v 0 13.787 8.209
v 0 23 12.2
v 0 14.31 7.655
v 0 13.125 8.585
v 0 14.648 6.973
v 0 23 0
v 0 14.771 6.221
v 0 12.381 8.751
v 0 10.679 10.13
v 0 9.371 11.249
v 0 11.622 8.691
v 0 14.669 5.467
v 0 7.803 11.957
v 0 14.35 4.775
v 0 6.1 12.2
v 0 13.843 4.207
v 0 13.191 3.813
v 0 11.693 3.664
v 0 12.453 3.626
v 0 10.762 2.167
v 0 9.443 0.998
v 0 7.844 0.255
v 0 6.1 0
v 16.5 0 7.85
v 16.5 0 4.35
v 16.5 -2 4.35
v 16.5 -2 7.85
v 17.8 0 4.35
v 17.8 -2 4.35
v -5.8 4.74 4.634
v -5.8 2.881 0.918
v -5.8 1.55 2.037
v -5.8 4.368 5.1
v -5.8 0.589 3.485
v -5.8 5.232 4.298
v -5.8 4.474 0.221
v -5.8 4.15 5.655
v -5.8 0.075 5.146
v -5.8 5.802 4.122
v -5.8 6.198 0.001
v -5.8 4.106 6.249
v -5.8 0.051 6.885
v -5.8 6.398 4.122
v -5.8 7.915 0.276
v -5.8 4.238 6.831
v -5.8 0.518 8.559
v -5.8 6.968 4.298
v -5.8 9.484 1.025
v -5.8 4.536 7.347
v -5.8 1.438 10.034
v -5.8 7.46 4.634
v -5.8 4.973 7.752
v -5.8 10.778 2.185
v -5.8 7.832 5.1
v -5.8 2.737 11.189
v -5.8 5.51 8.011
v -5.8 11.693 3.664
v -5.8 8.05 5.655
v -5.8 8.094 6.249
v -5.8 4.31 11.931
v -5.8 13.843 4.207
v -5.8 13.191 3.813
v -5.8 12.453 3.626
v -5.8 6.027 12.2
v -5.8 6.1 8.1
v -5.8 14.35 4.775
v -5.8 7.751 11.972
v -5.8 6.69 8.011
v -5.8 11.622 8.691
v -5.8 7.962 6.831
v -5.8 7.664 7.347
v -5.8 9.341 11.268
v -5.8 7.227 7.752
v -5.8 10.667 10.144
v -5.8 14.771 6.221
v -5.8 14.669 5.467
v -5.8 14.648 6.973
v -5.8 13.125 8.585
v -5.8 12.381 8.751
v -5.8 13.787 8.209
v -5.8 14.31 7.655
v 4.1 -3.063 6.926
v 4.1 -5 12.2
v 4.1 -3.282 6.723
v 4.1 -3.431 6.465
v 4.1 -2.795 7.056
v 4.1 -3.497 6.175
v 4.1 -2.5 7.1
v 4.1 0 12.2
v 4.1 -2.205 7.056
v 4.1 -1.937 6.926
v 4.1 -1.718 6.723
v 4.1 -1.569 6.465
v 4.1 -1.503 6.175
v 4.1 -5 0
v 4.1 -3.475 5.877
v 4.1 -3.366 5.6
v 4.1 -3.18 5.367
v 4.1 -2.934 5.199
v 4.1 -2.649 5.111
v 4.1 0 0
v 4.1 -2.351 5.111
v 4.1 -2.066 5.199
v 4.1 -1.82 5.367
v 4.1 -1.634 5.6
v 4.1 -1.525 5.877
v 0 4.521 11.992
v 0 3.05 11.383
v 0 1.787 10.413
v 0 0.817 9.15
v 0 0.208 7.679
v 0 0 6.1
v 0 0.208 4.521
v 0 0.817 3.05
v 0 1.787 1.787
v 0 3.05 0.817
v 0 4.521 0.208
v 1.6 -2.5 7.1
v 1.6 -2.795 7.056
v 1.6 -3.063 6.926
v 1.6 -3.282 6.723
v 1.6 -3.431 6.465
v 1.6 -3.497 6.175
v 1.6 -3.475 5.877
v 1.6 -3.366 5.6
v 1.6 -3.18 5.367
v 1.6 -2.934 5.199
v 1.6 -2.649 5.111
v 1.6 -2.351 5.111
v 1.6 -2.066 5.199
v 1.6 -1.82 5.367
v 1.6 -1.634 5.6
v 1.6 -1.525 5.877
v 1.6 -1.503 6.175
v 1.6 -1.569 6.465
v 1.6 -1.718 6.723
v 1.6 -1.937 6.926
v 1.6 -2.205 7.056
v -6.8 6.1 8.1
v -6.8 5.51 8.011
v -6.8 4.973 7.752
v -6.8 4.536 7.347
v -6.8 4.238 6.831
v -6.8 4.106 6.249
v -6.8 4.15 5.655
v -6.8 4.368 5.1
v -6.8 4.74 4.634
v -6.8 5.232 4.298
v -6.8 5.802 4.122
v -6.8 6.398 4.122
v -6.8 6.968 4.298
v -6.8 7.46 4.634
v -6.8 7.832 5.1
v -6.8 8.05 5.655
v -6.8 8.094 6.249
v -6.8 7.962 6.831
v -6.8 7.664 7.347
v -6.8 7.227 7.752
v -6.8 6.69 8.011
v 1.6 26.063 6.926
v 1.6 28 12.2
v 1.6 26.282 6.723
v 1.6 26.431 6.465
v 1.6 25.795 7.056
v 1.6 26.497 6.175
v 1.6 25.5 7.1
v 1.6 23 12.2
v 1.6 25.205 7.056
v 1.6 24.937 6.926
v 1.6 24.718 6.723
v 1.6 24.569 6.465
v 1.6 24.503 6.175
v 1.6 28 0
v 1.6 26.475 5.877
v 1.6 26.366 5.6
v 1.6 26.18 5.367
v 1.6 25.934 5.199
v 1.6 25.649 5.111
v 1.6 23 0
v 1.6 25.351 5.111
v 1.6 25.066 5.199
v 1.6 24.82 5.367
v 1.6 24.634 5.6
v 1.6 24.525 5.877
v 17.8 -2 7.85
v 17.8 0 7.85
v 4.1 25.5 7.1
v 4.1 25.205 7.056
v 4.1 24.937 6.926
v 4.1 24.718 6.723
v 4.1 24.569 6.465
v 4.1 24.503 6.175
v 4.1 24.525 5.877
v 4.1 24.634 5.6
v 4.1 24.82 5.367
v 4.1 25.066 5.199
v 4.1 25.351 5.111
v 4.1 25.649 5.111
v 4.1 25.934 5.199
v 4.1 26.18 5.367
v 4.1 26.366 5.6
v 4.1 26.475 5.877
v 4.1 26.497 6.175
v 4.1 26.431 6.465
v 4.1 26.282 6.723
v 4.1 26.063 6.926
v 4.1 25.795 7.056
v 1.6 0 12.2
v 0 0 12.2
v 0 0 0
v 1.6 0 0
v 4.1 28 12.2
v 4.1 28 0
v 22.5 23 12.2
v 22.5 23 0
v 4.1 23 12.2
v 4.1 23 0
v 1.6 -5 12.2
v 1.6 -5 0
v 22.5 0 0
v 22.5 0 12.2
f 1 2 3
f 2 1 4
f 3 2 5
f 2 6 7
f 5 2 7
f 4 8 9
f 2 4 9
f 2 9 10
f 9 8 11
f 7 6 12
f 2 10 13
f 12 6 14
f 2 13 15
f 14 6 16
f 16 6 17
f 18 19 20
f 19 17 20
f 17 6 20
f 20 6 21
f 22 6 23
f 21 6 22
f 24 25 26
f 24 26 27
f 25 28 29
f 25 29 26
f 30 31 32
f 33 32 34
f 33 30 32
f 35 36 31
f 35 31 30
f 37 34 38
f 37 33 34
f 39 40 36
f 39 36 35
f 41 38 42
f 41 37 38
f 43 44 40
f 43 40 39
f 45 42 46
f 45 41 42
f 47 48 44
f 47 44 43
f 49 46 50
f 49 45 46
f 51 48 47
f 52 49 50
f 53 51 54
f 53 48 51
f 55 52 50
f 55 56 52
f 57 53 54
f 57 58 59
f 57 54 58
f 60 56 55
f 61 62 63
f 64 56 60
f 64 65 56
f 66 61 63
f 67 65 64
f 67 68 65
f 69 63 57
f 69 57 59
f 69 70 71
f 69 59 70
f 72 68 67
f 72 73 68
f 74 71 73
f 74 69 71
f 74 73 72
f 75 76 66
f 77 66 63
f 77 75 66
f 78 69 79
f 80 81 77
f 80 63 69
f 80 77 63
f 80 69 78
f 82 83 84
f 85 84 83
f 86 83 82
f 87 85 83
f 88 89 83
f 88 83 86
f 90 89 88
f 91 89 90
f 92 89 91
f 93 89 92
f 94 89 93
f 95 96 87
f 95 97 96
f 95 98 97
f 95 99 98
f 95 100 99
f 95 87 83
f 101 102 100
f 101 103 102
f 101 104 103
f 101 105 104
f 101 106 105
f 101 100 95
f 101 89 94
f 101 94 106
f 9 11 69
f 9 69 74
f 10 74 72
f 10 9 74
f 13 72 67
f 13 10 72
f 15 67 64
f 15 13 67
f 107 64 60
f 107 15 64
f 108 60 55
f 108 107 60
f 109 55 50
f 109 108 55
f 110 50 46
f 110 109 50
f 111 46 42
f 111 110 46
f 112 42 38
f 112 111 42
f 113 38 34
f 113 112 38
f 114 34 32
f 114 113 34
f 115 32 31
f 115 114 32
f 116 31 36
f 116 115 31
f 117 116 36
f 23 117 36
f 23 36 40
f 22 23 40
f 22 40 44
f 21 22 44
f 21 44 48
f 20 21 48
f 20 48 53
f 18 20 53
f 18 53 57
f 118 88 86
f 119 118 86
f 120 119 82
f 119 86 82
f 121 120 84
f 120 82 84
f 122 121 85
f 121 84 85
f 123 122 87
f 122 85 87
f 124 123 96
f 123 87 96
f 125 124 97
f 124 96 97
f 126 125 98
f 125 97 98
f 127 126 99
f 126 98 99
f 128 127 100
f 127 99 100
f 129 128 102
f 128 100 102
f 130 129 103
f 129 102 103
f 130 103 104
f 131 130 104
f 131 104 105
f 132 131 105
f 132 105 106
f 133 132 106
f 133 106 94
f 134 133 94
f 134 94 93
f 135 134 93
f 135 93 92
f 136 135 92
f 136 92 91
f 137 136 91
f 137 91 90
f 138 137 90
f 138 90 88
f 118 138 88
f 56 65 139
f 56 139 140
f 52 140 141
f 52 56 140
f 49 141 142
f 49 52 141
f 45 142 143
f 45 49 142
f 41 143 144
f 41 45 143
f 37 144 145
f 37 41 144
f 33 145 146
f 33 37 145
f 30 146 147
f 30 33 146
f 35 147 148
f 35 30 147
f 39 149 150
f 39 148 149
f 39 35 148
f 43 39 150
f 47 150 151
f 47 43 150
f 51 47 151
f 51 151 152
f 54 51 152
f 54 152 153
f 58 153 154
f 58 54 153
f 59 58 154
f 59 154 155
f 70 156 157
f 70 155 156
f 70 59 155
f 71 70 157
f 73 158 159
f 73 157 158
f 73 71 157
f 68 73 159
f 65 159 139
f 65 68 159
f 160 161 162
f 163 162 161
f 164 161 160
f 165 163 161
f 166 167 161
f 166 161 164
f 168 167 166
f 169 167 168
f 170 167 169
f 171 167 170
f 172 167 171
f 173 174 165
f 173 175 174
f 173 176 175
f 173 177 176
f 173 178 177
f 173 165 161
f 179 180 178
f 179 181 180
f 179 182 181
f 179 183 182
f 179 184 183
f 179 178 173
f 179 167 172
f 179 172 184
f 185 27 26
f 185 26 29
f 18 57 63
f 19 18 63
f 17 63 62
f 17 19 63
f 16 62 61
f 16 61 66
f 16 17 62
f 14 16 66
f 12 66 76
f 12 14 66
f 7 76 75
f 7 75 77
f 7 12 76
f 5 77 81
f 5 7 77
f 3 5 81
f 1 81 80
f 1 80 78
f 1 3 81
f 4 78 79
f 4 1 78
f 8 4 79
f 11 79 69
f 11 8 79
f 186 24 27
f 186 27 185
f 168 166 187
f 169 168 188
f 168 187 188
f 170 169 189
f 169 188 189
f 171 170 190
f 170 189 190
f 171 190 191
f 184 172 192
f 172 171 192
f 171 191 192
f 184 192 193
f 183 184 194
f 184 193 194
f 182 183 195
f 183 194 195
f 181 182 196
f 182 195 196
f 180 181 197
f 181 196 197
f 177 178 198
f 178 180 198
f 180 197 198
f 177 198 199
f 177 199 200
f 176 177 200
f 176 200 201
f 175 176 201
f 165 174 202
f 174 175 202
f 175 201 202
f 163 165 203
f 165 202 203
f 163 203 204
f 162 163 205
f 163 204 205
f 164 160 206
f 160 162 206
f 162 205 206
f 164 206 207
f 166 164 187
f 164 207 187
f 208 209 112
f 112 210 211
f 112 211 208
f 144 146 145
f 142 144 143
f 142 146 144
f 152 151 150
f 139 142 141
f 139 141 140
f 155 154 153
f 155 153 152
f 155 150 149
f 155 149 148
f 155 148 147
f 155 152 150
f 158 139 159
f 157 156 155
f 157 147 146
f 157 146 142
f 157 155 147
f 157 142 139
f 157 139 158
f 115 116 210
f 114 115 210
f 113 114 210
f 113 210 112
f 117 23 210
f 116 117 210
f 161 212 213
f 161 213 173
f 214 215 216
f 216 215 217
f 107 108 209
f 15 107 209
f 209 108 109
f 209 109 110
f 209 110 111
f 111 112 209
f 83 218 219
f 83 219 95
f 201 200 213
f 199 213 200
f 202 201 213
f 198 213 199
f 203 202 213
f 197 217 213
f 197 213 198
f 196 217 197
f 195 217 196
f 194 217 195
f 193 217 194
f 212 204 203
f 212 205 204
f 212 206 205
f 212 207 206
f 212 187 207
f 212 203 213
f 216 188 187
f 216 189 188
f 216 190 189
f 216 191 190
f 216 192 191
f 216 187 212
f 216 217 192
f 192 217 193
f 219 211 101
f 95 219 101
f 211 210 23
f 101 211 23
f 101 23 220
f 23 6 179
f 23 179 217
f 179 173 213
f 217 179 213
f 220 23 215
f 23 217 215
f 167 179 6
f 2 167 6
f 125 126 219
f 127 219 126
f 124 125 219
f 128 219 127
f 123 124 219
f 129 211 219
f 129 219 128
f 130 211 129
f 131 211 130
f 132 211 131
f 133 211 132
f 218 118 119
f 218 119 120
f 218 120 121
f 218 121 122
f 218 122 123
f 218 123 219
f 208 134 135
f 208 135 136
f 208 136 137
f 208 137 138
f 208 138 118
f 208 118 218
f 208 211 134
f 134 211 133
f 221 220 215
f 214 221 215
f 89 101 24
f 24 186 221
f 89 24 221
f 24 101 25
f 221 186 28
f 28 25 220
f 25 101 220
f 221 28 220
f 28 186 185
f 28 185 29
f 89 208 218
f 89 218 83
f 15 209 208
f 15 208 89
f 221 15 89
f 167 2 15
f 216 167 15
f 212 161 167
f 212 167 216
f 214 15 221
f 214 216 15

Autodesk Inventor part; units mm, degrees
ref_plane "YZ Plane" through (0, 0, 0) normal (1, 0, 0) x (0, 1, 0)
ref_plane "XZ Plane" through (0, 0, 0) normal (0, 1, 0) x (-1, 0, 0)
ref_plane "XY Plane" through (0, 0, 0) normal (0, 0, 1) x (1, 0, 0)
sketch "Sketch1" plane through (0, 0, 0) normal (0, 0, 1) x (1, 0, 0)
  line L0 (0, 0) -> (22.5, 0)
  line L1 (22.5, 0) -> (22.5, 23)
  line L2 (22.5, 23) -> (0, 23)
  line L3 (0, 23) -> (0, 0)
  dimension "d0" = 22.5
  dimension "d1" = 23
extrude "Extrusion1" add sketch "Sketch1" along normal blind 12.2
sketch "Sketch2" plane through (0, 0, 0) normal (0, -1, 0) x (1, 0, 0)
  line L0 (0, 12.2) -> (22.5, 12.2) projected
  line L1 (0, 0) -> (22.5, 0) projected
  line L2 (1.6, 12.2) -> (4.1, 12.2)
  line L3 (4.1, 12.2) -> (4.1, 0)
  line L4 (4.1, 0) -> (1.6, 0)
  line L5 (1.6, 0) -> (1.6, 12.2)
  line L6 (22.5, 0) -> (22.5, 12.2) projected
  dimension "d4" = 2.5
  dimension "d5" = 18.4
extrude "Extrusion2" add sketch "Sketch2" along normal blind 5 contours L0 L3 L1 L5
ref_plane "Work Plane1" through (22.5, 11.5, 0) normal (0, -1, 0) x (1, 0, 0)
mirror "Mirror1" about plane through (22.5, 11.5, 0) normal (0, -1, 0) of "Extrusion2"
ref_plane "Work Plane3" through (0, -2.5, 0) normal (0, -1, 0) x (1, 0, 0)
ref_plane "Work Plane4" through (0, 0, 6.1) normal (0, 0, 1) x (1, 0, 0)
hole "Hole1" at (1.6, -2.5, 6.1) direction (1, 0, 0) diameter 2 end through all
mirror "Mirror2" about plane through (22.5, 11.5, 0) normal (0, -1, 0) of "Hole1"
sketch "Sketch3" plane through (22.5, 0, 0) normal (0, -1, 0) x (1, 0, 0)
  line L0 (-4.7, 4.35) -> (-6, 4.35)
  line L1 (-6, 4.35) -> (-6, 7.85)
  line L2 (-6, 7.85) -> (-4.7, 7.85)
  line L3 (-4.7, 7.85) -> (-4.7, 4.35)
  line L4 (0, 12.2) -> (0, 0) projected
  line L5 (0, 0) -> (-18.4, 0) projected
  line L6 (-18.4, 12.2) -> (-18.4, 0) projected
  line L7 (-20.9, 12.2) -> (-18.4, 12.2) projected
  line L8 (-20.9, 0) -> (-20.9, 12.2) projected
  line L9 (-20.9, 0) -> (-22.5, 0) projected
  line L10 (-22.5, 0) -> (-22.5, 12.2) projected
  line L11 (-22.5, 12.2) -> (-20.9, 12.2) projected
  line L12 (-18.4, 12.2) -> (0, 12.2) projected
  line L13 (-18.4, 0) -> (-20.9, 0) projected
  line L14 (0, 12.2) -> (0, 0) projected
  line L15 (0, 0) -> (-18.4, 0) projected
  line L16 (-18.4, 12.2) -> (-18.4, 0) projected
  line L17 (-20.9, 12.2) -> (-18.4, 12.2) projected
  line L18 (-20.9, 0) -> (-20.9, 12.2) projected
  line L19 (-20.9, 0) -> (-22.5, 0) projected
  line L20 (-22.5, 0) -> (-22.5, 12.2) projected
  line L21 (-22.5, 12.2) -> (-20.9, 12.2) projected
  line L22 (-18.4, 12.2) -> (0, 12.2) projected
  line L23 (-18.4, 0) -> (-20.9, 0) projected
  line L24 (0, 12.2) -> (0, 0) projected
  line L25 (0, 0) -> (-18.4, 0) projected
  line L26 (-18.4, 12.2) -> (-18.4, 0) projected
  line L27 (-20.9, 12.2) -> (-18.4, 12.2) projected
  line L28 (-20.9, 0) -> (-20.9, 12.2) projected
  line L29 (-20.9, 0) -> (-22.5, 0) projected
  line L30 (-22.5, 0) -> (-22.5, 12.2) projected
  line L31 (-22.5, 12.2) -> (-20.9, 12.2) projected
  line L32 (-18.4, 12.2) -> (0, 12.2) projected
  line L33 (-18.4, 0) -> (-20.9, 0) projected
  line L34 (-27, 6.1) -> (4.5, 6.1) projected
  point P0 (-6, 6.1)
  dimension "d17" = 1.3
  dimension "d18" = 3.5
  dimension "d19" = 4.7
extrude "Extrusion3" add sketch "Sketch3" along normal blind 2 contours L0 L1 L34 L3 | L34 L1 L2 L3
sketch "Sketch4" plane through (0, 0, 0) normal (-1, 0, 0) x (0, 0, 1)
  line L0 (6.1, 34.6) -> (6.1, -11.6) projected
  circle A0 centre (6.1, 6.1) radius 6.1
  line L1 (0, 0) -> (0, 23) projected
  line L2 (0, 0) -> (12.2, 0) projected
extrude "Extrusion4" add sketch "Sketch4" along normal blind 5.8 contours A0 L0 | L0 A0
sketch "Sketch5" plane through (-5.8, 6.1, 6.1) normal (-1, 0, 0) x (0, 0, 1)
  circle A0 centre (0, 0) radius 2
  point P0 (-6.1, -6.1)
  dimension "d24" = 4
extrude "Extrusion5" add sketch "Sketch5" along normal blind 1
sketch "Sketch6" plane through (0, 23, 0) normal (-1, 0, 0) x (0, 0, 1)
  circle A0 centre (6.1, -16.9) radius 6.1 projected
  arc A1 (12.2, -16.9) -> (0, -16.9) centre (6.1, -16.9) ccw projected
  circle A2 centre (6.1854, -10.8006) radius 2.5717
  point P0 (0, -23)
extrude "Extrusion6" add sketch "Sketch6" along normal up to surface (5.8 mm away) contours A2 A0 | A0 A2 picked at (5.289, -10.1215) picked at (6.9125, -11.6556)
ref_plane "Work Plane2" through (22.5, 11.5, 0) normal (0, -1, 0) x (1, 0, 0)
properties part number "servo_metal_600TVL"
